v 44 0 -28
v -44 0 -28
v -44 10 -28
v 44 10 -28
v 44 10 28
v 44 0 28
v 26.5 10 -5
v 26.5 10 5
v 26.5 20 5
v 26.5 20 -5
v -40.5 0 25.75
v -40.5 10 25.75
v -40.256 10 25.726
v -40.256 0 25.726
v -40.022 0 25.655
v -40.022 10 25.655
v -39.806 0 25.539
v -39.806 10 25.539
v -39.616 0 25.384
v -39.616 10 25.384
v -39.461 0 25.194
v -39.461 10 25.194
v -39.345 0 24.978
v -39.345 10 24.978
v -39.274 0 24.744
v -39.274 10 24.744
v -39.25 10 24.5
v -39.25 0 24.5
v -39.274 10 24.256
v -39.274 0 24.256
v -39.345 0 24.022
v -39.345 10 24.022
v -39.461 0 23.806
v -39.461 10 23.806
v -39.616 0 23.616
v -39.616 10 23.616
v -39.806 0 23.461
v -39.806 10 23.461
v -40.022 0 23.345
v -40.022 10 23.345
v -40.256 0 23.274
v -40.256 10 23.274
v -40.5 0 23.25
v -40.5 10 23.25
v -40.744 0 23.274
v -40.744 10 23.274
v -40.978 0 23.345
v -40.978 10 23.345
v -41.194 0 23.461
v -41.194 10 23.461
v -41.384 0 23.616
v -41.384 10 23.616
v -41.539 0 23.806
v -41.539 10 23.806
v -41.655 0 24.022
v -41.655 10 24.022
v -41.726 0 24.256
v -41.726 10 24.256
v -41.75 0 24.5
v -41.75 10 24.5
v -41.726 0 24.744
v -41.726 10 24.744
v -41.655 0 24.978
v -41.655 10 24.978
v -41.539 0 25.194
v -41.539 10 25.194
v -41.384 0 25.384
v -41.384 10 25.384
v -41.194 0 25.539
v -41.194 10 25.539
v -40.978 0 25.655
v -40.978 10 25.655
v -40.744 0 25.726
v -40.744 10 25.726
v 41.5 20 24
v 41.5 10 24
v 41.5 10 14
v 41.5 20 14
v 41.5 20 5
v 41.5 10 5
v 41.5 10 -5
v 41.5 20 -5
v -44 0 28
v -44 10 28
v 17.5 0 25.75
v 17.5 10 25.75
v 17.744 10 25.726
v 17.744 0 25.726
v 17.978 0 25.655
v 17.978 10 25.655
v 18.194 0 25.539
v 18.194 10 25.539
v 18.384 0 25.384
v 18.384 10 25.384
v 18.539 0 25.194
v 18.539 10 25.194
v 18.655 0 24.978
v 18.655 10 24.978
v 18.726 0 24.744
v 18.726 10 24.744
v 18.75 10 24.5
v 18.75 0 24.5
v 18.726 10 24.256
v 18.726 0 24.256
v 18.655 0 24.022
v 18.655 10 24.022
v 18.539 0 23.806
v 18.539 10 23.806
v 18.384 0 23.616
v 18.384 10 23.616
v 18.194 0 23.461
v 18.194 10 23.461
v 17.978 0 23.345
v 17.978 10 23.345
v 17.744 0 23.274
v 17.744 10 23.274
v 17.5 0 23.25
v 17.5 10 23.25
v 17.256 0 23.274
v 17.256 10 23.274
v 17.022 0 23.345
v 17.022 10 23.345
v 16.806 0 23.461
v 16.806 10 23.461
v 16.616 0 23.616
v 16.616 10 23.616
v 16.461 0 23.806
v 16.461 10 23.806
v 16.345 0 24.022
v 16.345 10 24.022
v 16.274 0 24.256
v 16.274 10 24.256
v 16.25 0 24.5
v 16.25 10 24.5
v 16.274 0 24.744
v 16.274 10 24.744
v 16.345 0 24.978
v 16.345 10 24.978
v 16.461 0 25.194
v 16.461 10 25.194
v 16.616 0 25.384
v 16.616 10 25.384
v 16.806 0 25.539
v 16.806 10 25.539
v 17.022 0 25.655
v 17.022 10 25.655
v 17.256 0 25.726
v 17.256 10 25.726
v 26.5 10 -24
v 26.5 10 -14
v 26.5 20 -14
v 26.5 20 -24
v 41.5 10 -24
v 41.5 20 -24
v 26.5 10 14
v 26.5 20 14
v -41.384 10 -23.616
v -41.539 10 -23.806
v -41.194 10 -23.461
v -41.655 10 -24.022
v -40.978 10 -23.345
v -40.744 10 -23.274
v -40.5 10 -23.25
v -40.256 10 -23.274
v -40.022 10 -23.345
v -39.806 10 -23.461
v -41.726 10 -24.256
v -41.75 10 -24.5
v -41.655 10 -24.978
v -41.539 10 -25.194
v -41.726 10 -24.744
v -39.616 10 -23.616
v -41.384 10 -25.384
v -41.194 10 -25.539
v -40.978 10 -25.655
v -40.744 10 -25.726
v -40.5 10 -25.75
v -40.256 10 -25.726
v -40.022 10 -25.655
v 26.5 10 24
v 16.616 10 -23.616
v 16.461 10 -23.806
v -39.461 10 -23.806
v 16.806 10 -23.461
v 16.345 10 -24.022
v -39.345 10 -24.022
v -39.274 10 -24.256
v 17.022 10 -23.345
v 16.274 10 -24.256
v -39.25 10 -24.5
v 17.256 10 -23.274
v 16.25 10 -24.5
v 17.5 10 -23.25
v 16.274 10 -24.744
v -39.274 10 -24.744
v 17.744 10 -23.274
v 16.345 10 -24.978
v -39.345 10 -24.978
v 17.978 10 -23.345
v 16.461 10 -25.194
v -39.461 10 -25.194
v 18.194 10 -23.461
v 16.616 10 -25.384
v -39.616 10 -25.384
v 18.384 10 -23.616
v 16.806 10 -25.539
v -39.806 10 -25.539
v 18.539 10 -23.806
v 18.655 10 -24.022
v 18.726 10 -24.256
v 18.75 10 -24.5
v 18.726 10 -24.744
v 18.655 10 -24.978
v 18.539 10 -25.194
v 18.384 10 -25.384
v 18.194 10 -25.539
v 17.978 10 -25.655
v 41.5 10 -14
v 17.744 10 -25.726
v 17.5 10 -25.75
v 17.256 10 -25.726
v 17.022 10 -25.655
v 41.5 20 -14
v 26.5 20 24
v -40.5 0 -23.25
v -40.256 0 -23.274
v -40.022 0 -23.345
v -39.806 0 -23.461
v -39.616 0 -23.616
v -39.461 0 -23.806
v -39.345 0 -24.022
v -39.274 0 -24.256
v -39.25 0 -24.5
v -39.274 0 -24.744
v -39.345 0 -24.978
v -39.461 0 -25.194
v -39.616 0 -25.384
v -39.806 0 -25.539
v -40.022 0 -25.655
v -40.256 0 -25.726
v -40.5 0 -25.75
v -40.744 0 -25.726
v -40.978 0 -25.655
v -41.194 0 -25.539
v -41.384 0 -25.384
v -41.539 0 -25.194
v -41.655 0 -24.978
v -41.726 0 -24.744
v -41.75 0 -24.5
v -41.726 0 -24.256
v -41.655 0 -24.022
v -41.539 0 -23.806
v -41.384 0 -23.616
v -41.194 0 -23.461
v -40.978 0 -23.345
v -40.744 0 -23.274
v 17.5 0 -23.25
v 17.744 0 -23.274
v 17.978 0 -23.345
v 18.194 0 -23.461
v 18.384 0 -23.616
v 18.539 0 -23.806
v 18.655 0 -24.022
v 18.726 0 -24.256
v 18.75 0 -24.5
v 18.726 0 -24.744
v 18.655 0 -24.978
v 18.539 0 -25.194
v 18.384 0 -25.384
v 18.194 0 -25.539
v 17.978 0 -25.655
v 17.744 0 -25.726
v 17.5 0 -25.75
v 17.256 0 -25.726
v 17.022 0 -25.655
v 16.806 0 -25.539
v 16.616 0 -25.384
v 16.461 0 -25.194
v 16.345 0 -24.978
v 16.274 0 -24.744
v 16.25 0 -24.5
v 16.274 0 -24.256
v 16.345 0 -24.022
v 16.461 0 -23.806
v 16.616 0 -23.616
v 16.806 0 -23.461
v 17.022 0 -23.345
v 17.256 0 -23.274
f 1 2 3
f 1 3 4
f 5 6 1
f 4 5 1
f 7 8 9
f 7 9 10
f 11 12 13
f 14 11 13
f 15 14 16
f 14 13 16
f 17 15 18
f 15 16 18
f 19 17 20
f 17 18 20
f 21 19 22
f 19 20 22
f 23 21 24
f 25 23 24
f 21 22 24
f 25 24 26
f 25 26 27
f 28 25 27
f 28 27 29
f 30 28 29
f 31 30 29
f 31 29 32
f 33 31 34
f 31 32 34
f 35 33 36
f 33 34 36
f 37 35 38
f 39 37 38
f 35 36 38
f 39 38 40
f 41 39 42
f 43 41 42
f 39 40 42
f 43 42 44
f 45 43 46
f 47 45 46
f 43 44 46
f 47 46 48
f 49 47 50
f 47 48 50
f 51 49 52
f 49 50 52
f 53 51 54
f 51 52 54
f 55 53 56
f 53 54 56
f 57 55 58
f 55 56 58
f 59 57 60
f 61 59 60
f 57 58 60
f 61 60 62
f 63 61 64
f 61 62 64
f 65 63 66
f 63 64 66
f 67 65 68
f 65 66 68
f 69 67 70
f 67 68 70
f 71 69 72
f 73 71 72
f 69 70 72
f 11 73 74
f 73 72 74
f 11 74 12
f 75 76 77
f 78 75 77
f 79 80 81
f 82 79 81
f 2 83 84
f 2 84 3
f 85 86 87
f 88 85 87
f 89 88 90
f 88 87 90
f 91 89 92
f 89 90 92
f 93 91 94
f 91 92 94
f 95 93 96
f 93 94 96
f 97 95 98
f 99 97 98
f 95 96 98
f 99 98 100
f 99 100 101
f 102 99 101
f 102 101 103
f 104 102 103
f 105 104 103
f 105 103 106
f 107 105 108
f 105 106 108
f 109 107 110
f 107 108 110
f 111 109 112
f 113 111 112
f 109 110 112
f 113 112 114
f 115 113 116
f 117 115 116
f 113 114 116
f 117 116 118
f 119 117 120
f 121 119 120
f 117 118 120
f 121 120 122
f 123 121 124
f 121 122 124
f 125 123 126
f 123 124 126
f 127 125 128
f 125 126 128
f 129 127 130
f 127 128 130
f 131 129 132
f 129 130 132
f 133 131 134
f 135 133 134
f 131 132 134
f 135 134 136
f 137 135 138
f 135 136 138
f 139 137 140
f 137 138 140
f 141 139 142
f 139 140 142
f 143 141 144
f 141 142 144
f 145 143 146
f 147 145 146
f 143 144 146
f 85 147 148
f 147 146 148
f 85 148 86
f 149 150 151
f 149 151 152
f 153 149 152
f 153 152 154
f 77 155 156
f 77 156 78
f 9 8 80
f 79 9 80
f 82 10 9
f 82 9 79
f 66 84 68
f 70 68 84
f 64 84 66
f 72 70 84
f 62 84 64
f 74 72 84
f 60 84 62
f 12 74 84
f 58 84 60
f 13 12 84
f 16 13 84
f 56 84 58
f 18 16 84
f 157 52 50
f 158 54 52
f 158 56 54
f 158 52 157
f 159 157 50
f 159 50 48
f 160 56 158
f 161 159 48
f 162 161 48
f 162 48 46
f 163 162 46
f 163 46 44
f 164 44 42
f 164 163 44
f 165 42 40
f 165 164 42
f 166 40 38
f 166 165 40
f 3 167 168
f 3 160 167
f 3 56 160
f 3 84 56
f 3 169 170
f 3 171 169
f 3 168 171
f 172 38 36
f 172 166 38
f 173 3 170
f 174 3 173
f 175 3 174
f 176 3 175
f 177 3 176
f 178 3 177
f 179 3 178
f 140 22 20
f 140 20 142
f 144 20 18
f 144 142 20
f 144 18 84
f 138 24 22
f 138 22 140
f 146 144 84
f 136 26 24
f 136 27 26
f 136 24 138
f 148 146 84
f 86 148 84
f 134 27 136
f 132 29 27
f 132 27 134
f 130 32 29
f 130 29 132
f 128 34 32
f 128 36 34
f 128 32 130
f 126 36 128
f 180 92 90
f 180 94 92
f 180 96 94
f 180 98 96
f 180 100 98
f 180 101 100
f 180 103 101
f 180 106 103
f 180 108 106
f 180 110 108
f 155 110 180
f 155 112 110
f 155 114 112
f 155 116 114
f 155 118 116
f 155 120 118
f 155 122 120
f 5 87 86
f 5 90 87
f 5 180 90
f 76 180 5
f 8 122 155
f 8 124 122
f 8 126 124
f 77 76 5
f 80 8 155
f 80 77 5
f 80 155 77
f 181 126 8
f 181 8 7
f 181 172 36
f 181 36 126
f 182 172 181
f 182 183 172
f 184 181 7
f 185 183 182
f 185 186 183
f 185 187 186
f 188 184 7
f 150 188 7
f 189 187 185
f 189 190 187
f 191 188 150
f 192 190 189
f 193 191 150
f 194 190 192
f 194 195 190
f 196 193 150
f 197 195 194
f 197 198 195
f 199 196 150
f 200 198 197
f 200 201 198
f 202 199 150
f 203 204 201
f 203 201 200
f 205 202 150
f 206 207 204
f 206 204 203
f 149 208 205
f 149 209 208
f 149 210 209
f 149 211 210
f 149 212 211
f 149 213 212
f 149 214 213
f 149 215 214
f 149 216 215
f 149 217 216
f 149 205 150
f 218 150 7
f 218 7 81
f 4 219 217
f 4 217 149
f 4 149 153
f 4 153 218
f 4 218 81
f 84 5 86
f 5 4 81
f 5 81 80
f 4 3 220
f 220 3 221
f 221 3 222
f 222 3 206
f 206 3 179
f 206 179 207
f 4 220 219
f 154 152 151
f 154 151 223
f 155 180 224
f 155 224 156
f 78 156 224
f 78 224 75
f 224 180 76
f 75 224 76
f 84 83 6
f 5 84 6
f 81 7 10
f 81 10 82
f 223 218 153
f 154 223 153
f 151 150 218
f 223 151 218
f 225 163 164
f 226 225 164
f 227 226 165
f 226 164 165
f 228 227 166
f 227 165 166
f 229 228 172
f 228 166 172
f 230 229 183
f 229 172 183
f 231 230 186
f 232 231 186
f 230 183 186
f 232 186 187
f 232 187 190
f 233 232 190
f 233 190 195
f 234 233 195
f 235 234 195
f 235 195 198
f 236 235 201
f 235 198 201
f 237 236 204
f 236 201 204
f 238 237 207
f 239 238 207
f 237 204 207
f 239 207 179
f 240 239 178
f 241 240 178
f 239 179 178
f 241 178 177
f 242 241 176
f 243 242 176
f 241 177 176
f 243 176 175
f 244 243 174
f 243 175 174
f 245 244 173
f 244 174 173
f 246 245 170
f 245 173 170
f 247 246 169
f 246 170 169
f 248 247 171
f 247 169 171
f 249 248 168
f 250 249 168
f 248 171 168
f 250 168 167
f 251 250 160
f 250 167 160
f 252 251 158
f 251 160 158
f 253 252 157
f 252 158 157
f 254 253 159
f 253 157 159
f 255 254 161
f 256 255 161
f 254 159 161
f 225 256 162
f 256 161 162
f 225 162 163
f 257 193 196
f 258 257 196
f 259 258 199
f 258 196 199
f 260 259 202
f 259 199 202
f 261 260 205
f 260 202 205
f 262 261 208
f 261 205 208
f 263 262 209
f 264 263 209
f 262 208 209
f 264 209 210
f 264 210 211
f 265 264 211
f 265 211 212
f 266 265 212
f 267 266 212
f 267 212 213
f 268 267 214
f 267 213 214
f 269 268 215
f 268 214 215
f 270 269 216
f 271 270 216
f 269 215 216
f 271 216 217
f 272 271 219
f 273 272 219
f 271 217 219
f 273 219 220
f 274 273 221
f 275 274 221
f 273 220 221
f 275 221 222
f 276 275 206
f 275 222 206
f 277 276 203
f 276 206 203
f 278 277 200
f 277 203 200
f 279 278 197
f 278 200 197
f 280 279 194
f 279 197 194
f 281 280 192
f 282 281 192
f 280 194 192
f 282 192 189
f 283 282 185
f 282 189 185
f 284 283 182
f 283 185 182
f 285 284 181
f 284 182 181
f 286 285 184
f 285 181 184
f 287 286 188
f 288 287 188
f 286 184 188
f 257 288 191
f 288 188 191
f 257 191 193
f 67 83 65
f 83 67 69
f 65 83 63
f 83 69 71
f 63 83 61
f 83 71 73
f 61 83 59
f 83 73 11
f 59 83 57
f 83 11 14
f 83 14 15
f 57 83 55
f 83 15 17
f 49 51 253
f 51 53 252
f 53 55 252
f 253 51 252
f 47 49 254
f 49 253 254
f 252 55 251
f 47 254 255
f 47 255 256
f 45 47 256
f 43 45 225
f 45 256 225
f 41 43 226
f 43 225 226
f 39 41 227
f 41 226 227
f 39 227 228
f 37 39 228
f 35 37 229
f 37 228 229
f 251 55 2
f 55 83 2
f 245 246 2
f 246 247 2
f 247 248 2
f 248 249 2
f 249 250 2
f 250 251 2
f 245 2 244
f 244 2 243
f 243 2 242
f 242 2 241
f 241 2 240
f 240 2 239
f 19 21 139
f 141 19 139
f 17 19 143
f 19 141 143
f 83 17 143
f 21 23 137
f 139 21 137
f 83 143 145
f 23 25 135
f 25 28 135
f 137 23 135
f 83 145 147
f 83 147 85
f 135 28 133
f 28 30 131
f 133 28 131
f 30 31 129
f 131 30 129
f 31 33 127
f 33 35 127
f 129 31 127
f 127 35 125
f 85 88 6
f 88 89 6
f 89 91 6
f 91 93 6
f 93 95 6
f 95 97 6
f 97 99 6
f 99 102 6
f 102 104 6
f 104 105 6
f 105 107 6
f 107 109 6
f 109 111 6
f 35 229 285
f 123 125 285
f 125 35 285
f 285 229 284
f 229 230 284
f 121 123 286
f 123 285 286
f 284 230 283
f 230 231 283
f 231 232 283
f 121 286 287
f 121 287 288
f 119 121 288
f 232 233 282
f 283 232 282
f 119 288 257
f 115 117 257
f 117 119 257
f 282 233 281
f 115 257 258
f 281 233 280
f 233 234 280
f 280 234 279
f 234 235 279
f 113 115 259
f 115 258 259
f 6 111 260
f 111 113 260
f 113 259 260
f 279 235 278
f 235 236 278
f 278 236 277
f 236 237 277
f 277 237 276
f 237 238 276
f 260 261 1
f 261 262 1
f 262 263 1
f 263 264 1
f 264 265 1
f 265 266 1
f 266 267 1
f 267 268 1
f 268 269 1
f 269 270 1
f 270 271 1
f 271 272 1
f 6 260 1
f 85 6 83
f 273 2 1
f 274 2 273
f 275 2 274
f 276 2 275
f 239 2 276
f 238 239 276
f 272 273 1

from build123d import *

# Parameters (mm, degrees)
SKETCH1_W           = 88
SKETCH1_H           = 56
BOSS_EXTRUDE2_DEPTH = 10
SKETCH2_R           = 1.25
CUT_EXTRUDE1_DEPTH  = 10
SKETCH3_W           = 15
SKETCH3_H           = 10
BOSS_EXTRUDE3_DEPTH = 10


with BuildPart() as part:
    # Sketch1 → Boss-Extrude2 (new body)
    with BuildSketch(Plane(origin=(0, 0, 0), x_dir=(1, 0, 0), z_dir=(0, 1, 0))):
        Rectangle(SKETCH1_W, SKETCH1_H)
    extrude(amount=BOSS_EXTRUDE2_DEPTH)

    # Sketch2 → Cut-Extrude1 (cut)
    with BuildSketch(Plane(origin=(0, 10, 0), x_dir=(1, 0, 0), z_dir=(0, 1, 0))):
        with Locations(Location((-40.5, 24.5, 0), (0, 0, 270))):
            Circle(SKETCH2_R)
        with Locations(Location((17.5, 24.5, 0), (0, 0, 270))):
            Circle(SKETCH2_R)
        with Locations(Location((-40.5, -24.5, 0), (0, 0, 270))):
            Circle(SKETCH2_R)
        with Locations(Location((17.5, -24.5, 0), (0, 0, 270))):
            Circle(SKETCH2_R)
    extrude(amount=-CUT_EXTRUDE1_DEPTH, mode=Mode.SUBTRACT)

    # Sketch3 → Boss-Extrude3 (add)
    with BuildSketch(Plane(origin=(0, 10, 0), x_dir=(1, 0, 0), z_dir=(0, 1, 0))):
        with Locations((34, 19)):
            Rectangle(SKETCH3_W, SKETCH3_H)
        with Locations((34, 0)):
            Rectangle(SKETCH3_W, SKETCH3_H)
        with Locations((34, -19)):
            Rectangle(SKETCH3_W, SKETCH3_H)
    extrude(amount=BOSS_EXTRUDE3_DEPTH)


solid = part.part
